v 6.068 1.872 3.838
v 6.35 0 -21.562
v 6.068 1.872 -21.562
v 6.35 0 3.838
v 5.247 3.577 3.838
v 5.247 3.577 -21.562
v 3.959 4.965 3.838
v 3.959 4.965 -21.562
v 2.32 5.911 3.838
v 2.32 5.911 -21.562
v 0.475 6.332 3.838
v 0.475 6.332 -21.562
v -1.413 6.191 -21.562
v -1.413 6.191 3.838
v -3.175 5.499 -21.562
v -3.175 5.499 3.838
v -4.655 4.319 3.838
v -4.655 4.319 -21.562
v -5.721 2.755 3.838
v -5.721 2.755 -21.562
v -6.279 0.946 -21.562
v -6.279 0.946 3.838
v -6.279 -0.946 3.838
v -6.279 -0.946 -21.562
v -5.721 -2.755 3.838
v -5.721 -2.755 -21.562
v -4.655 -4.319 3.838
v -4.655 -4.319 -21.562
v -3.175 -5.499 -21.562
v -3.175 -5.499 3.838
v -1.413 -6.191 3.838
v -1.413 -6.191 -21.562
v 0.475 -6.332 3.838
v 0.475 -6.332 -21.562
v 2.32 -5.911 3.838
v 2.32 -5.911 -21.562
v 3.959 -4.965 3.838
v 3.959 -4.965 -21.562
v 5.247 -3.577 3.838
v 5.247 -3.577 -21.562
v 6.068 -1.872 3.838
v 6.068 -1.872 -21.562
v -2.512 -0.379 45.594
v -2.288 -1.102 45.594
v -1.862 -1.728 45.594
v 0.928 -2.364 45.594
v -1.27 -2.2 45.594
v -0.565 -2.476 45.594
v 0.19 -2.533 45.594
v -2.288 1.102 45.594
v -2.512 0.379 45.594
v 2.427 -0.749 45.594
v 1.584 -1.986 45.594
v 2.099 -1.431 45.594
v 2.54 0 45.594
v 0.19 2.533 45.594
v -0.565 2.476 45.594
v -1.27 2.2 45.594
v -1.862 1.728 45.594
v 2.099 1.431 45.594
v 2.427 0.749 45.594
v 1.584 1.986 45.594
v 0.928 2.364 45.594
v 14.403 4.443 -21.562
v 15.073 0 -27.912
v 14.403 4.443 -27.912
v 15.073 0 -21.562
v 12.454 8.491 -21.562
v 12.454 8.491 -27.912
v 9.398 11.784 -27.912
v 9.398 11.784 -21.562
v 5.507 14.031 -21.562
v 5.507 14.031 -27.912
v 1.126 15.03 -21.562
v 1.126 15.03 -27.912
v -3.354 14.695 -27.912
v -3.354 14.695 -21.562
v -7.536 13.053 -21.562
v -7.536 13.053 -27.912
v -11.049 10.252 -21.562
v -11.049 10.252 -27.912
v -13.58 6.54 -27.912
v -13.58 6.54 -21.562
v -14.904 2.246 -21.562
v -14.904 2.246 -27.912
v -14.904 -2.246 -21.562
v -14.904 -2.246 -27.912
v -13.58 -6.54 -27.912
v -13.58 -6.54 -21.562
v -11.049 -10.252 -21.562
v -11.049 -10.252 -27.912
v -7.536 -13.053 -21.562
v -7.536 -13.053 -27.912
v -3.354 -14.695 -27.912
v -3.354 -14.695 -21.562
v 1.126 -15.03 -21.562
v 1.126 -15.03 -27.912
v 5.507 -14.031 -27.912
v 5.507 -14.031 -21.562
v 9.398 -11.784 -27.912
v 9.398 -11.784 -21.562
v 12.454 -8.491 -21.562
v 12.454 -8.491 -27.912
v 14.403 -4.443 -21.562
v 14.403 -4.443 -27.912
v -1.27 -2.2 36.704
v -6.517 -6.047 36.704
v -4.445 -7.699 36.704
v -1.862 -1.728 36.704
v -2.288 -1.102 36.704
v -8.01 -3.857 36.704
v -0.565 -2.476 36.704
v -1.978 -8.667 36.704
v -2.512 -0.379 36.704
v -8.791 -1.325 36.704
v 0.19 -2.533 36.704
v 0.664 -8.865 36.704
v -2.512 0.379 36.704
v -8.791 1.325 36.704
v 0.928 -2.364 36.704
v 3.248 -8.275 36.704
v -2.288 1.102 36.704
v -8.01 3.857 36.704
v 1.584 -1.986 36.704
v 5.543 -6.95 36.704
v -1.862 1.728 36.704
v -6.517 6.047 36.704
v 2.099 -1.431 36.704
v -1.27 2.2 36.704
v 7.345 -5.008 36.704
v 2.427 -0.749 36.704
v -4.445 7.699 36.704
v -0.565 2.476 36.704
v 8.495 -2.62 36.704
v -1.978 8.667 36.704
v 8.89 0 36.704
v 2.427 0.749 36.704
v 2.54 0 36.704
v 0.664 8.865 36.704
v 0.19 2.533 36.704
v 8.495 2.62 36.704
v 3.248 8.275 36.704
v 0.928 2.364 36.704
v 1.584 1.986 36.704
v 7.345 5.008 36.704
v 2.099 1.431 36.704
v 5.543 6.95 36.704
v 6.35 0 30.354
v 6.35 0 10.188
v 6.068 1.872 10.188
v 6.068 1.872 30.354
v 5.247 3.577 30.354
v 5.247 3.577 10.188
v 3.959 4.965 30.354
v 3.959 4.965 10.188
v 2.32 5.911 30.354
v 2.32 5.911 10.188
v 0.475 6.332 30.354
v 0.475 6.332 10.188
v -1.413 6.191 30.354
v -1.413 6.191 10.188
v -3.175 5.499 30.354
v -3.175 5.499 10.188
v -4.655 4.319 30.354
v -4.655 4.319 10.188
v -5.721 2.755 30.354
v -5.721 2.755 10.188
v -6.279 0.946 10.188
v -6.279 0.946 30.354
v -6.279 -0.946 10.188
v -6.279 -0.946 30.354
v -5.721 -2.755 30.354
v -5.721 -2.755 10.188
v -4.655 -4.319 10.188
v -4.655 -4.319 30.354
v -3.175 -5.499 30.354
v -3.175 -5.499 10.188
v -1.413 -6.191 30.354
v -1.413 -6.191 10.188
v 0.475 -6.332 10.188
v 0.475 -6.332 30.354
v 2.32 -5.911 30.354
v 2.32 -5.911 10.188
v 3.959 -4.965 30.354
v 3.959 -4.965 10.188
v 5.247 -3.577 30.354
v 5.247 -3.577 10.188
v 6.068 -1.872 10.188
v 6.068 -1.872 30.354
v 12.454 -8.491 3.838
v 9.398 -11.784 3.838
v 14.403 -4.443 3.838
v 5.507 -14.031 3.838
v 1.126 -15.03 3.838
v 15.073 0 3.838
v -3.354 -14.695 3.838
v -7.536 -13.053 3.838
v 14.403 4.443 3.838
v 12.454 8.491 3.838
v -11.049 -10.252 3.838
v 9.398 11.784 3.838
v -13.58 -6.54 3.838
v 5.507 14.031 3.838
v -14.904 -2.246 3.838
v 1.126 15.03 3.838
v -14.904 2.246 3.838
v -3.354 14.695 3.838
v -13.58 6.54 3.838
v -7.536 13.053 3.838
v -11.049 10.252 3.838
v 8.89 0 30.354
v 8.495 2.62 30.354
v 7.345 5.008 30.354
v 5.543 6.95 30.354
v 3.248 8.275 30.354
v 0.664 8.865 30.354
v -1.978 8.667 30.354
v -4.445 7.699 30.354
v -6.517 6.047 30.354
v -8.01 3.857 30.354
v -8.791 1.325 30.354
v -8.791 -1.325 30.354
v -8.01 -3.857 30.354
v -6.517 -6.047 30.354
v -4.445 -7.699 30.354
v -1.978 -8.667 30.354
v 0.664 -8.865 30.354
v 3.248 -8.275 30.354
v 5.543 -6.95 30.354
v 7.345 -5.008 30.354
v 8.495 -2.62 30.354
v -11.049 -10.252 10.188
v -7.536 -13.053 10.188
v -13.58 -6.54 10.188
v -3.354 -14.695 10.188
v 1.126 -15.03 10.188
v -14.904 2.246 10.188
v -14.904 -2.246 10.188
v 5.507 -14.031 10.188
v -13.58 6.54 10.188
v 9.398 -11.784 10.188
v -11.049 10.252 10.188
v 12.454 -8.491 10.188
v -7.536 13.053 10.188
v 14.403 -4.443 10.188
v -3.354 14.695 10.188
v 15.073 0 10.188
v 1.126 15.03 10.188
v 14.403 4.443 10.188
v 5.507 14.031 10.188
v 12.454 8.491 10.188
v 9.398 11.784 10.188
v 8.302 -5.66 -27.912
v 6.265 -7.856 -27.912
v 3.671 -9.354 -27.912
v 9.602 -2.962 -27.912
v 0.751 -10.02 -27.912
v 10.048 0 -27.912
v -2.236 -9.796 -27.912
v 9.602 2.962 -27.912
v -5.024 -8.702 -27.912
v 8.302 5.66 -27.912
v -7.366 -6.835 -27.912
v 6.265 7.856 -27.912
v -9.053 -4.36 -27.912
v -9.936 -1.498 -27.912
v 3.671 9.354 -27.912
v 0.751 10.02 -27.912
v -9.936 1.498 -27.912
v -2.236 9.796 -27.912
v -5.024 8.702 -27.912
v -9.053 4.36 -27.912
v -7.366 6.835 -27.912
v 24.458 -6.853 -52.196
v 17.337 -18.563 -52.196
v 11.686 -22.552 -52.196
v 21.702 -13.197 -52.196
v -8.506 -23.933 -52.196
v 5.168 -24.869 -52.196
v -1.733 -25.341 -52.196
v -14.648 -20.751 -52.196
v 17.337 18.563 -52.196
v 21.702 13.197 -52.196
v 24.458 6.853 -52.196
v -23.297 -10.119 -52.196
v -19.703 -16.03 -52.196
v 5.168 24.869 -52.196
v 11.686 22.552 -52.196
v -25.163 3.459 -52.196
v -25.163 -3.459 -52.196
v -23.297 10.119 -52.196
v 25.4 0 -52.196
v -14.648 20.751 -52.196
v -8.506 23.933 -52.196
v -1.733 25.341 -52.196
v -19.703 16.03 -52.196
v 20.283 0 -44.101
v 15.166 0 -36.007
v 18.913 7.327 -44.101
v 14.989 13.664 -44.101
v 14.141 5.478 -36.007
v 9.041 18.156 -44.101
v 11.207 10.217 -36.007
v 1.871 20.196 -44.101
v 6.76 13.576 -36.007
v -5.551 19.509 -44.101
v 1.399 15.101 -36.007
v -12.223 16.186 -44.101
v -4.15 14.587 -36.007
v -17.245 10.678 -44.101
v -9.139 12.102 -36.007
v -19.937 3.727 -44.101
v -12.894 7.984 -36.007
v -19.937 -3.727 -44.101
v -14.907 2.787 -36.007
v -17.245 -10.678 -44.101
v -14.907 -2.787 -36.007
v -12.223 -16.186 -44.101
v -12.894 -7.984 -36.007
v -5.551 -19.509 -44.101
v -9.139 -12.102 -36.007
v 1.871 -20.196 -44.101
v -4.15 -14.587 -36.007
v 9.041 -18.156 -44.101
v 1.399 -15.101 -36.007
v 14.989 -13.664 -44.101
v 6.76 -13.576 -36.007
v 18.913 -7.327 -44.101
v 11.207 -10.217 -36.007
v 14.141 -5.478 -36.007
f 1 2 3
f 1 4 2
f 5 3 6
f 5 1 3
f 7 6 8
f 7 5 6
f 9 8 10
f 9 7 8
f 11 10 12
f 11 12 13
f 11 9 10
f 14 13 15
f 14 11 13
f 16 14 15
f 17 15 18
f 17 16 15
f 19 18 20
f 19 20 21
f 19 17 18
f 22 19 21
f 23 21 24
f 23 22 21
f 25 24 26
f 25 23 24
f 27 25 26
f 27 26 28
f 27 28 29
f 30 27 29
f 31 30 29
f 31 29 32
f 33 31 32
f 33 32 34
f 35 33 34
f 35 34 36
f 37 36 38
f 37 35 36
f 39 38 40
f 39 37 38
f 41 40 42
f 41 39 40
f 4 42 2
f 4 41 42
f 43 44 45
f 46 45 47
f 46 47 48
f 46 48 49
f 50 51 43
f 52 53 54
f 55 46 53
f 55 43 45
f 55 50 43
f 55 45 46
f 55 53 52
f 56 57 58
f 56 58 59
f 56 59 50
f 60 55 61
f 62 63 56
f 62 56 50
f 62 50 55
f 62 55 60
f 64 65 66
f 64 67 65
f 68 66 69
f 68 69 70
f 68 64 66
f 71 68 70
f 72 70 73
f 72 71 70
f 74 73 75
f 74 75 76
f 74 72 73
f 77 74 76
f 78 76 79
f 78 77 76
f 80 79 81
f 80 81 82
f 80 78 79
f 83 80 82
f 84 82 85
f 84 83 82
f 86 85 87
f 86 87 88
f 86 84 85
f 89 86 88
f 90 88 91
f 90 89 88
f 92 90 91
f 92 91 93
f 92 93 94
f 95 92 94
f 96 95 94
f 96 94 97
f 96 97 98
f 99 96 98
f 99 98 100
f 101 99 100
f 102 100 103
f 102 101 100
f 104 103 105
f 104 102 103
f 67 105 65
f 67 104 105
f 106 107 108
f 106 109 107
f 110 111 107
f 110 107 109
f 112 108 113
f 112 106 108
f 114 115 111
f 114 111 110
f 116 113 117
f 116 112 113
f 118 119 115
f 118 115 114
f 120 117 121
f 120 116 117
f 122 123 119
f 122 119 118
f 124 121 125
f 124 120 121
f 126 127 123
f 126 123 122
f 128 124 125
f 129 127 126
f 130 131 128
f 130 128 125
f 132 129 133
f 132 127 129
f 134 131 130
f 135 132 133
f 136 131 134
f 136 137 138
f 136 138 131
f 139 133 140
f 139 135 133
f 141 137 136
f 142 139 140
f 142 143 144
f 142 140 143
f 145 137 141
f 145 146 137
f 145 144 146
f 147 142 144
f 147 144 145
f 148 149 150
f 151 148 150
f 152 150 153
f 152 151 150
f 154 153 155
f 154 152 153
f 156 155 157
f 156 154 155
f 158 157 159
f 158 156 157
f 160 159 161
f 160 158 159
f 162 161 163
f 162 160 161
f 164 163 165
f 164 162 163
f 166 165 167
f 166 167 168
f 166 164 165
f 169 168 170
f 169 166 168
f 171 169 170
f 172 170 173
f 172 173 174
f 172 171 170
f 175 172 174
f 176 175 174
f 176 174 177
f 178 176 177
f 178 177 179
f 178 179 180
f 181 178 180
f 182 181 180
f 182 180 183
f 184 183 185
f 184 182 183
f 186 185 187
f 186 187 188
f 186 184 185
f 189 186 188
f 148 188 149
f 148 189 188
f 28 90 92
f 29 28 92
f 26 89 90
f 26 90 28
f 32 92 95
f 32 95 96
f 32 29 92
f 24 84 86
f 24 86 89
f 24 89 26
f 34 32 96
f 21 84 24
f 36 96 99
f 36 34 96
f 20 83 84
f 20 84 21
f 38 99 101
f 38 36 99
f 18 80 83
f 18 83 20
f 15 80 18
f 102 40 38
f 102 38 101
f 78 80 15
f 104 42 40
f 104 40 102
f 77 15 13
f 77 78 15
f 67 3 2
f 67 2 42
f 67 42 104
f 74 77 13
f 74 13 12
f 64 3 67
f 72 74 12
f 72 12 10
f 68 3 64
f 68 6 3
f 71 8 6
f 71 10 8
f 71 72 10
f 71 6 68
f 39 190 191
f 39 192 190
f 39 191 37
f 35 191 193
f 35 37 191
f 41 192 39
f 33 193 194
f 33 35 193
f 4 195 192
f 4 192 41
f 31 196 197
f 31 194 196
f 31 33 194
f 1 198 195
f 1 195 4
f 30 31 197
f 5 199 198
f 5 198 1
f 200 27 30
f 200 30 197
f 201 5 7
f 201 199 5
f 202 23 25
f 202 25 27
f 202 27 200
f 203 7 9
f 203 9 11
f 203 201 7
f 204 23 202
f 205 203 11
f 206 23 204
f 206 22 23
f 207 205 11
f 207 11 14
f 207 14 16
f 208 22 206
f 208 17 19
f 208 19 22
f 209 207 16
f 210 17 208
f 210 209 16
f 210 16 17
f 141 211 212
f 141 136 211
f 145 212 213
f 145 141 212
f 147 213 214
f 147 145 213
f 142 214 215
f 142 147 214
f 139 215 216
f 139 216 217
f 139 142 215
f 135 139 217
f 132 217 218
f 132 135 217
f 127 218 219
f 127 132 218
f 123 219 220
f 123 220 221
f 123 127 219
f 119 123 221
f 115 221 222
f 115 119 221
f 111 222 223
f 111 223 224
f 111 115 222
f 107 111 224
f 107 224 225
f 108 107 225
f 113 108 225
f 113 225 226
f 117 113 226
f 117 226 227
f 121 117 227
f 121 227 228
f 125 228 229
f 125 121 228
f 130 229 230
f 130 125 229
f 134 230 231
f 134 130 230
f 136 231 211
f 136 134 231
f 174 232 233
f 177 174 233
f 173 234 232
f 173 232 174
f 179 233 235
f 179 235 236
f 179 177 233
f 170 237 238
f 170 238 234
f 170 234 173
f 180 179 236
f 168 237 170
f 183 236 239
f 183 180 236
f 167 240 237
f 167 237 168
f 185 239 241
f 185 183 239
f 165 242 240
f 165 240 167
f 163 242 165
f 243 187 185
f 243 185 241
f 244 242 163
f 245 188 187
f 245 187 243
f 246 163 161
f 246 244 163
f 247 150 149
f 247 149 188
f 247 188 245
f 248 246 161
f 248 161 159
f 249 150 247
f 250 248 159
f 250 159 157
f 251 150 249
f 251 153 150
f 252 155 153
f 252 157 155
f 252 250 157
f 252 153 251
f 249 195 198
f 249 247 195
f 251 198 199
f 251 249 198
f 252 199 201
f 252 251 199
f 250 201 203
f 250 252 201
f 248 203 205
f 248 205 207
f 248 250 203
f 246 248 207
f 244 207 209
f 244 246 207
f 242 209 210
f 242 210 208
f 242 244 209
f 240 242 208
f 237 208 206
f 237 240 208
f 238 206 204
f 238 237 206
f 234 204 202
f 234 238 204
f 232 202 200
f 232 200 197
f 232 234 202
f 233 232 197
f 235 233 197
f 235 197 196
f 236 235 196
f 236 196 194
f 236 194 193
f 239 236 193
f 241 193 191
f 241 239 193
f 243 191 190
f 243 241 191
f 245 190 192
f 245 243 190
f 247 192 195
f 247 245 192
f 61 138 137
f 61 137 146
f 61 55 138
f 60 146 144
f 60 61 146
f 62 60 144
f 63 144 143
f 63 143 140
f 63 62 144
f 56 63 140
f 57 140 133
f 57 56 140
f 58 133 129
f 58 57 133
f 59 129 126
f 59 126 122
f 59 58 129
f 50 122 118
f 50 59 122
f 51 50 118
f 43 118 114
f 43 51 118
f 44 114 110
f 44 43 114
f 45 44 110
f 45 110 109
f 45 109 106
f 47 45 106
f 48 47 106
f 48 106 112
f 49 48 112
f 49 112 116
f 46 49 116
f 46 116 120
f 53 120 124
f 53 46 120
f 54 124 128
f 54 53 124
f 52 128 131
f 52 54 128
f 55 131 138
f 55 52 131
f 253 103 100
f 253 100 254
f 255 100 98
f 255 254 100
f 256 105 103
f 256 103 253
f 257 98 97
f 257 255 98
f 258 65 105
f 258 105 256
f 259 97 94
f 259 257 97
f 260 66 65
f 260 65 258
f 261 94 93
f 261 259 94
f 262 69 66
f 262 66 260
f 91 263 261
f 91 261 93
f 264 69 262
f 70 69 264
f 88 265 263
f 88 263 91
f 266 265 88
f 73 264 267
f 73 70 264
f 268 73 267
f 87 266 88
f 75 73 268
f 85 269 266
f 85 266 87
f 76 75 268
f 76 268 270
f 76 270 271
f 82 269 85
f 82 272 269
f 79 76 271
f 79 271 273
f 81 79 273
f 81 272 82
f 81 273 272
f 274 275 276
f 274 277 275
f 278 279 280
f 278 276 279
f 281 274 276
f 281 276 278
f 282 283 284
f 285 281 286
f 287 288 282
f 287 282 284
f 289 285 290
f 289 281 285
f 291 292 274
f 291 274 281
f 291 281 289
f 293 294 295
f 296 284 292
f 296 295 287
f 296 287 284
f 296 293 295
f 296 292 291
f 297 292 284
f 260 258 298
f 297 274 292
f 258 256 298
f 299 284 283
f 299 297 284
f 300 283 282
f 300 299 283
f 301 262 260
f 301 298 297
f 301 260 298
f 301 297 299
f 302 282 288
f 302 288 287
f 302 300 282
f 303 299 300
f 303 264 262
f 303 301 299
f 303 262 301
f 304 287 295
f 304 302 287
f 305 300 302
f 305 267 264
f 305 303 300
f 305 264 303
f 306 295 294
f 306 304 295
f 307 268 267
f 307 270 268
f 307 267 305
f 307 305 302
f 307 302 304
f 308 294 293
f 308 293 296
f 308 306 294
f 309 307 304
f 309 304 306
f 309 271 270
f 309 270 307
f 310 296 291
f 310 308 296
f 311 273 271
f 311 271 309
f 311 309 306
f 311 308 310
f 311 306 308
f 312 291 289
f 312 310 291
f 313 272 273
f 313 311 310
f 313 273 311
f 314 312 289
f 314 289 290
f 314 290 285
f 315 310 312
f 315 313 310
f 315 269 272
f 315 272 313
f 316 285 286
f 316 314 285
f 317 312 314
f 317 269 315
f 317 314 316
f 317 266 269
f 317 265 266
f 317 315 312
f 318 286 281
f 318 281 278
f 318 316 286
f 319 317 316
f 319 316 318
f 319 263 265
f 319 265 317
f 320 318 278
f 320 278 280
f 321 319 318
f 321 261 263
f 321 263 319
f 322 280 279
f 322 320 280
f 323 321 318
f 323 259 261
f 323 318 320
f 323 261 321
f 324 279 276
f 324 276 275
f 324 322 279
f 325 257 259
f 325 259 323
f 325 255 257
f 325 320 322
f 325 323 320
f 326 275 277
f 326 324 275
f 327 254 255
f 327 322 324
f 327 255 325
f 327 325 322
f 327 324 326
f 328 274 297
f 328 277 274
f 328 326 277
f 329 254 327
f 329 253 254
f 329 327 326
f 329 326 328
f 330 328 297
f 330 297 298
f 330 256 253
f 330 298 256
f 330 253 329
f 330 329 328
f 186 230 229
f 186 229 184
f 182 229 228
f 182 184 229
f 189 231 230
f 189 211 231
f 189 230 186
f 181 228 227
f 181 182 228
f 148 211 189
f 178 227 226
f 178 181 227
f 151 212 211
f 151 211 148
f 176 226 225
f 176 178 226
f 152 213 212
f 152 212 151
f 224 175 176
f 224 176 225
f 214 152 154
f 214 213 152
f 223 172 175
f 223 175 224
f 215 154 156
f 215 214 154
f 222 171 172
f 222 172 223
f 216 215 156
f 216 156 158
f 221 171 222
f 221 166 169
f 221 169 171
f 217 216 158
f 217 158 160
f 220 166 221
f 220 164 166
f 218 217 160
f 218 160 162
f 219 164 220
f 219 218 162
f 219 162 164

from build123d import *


with BuildPart() as f1:
    # F0 (on Front) → F1 (revolve)
    with BuildSketch(Plane.XZ):
        Polygon((0, 36.704396), (0, 0), (0, -52.195604), (25.4, -52.195604), (10.048355, -27.912087), (15.072527, -27.912087), (15.072527, -21.562087), (6.35, -21.562087), (6.35, 3.837913), (15.072527, 3.837913), (15.072527, 10.187913), (6.35, 10.187913), (6.35, 30.354396), (8.89, 30.354396), (8.89, 36.704396), (6.35, 36.704396), (2.54, 36.704396), (2.54, 45.594396), (0, 45.594396), align=None)
    revolve(axis=Axis((0, 0, 18.352198), (0, 0, 1)))


solid = f1.part
